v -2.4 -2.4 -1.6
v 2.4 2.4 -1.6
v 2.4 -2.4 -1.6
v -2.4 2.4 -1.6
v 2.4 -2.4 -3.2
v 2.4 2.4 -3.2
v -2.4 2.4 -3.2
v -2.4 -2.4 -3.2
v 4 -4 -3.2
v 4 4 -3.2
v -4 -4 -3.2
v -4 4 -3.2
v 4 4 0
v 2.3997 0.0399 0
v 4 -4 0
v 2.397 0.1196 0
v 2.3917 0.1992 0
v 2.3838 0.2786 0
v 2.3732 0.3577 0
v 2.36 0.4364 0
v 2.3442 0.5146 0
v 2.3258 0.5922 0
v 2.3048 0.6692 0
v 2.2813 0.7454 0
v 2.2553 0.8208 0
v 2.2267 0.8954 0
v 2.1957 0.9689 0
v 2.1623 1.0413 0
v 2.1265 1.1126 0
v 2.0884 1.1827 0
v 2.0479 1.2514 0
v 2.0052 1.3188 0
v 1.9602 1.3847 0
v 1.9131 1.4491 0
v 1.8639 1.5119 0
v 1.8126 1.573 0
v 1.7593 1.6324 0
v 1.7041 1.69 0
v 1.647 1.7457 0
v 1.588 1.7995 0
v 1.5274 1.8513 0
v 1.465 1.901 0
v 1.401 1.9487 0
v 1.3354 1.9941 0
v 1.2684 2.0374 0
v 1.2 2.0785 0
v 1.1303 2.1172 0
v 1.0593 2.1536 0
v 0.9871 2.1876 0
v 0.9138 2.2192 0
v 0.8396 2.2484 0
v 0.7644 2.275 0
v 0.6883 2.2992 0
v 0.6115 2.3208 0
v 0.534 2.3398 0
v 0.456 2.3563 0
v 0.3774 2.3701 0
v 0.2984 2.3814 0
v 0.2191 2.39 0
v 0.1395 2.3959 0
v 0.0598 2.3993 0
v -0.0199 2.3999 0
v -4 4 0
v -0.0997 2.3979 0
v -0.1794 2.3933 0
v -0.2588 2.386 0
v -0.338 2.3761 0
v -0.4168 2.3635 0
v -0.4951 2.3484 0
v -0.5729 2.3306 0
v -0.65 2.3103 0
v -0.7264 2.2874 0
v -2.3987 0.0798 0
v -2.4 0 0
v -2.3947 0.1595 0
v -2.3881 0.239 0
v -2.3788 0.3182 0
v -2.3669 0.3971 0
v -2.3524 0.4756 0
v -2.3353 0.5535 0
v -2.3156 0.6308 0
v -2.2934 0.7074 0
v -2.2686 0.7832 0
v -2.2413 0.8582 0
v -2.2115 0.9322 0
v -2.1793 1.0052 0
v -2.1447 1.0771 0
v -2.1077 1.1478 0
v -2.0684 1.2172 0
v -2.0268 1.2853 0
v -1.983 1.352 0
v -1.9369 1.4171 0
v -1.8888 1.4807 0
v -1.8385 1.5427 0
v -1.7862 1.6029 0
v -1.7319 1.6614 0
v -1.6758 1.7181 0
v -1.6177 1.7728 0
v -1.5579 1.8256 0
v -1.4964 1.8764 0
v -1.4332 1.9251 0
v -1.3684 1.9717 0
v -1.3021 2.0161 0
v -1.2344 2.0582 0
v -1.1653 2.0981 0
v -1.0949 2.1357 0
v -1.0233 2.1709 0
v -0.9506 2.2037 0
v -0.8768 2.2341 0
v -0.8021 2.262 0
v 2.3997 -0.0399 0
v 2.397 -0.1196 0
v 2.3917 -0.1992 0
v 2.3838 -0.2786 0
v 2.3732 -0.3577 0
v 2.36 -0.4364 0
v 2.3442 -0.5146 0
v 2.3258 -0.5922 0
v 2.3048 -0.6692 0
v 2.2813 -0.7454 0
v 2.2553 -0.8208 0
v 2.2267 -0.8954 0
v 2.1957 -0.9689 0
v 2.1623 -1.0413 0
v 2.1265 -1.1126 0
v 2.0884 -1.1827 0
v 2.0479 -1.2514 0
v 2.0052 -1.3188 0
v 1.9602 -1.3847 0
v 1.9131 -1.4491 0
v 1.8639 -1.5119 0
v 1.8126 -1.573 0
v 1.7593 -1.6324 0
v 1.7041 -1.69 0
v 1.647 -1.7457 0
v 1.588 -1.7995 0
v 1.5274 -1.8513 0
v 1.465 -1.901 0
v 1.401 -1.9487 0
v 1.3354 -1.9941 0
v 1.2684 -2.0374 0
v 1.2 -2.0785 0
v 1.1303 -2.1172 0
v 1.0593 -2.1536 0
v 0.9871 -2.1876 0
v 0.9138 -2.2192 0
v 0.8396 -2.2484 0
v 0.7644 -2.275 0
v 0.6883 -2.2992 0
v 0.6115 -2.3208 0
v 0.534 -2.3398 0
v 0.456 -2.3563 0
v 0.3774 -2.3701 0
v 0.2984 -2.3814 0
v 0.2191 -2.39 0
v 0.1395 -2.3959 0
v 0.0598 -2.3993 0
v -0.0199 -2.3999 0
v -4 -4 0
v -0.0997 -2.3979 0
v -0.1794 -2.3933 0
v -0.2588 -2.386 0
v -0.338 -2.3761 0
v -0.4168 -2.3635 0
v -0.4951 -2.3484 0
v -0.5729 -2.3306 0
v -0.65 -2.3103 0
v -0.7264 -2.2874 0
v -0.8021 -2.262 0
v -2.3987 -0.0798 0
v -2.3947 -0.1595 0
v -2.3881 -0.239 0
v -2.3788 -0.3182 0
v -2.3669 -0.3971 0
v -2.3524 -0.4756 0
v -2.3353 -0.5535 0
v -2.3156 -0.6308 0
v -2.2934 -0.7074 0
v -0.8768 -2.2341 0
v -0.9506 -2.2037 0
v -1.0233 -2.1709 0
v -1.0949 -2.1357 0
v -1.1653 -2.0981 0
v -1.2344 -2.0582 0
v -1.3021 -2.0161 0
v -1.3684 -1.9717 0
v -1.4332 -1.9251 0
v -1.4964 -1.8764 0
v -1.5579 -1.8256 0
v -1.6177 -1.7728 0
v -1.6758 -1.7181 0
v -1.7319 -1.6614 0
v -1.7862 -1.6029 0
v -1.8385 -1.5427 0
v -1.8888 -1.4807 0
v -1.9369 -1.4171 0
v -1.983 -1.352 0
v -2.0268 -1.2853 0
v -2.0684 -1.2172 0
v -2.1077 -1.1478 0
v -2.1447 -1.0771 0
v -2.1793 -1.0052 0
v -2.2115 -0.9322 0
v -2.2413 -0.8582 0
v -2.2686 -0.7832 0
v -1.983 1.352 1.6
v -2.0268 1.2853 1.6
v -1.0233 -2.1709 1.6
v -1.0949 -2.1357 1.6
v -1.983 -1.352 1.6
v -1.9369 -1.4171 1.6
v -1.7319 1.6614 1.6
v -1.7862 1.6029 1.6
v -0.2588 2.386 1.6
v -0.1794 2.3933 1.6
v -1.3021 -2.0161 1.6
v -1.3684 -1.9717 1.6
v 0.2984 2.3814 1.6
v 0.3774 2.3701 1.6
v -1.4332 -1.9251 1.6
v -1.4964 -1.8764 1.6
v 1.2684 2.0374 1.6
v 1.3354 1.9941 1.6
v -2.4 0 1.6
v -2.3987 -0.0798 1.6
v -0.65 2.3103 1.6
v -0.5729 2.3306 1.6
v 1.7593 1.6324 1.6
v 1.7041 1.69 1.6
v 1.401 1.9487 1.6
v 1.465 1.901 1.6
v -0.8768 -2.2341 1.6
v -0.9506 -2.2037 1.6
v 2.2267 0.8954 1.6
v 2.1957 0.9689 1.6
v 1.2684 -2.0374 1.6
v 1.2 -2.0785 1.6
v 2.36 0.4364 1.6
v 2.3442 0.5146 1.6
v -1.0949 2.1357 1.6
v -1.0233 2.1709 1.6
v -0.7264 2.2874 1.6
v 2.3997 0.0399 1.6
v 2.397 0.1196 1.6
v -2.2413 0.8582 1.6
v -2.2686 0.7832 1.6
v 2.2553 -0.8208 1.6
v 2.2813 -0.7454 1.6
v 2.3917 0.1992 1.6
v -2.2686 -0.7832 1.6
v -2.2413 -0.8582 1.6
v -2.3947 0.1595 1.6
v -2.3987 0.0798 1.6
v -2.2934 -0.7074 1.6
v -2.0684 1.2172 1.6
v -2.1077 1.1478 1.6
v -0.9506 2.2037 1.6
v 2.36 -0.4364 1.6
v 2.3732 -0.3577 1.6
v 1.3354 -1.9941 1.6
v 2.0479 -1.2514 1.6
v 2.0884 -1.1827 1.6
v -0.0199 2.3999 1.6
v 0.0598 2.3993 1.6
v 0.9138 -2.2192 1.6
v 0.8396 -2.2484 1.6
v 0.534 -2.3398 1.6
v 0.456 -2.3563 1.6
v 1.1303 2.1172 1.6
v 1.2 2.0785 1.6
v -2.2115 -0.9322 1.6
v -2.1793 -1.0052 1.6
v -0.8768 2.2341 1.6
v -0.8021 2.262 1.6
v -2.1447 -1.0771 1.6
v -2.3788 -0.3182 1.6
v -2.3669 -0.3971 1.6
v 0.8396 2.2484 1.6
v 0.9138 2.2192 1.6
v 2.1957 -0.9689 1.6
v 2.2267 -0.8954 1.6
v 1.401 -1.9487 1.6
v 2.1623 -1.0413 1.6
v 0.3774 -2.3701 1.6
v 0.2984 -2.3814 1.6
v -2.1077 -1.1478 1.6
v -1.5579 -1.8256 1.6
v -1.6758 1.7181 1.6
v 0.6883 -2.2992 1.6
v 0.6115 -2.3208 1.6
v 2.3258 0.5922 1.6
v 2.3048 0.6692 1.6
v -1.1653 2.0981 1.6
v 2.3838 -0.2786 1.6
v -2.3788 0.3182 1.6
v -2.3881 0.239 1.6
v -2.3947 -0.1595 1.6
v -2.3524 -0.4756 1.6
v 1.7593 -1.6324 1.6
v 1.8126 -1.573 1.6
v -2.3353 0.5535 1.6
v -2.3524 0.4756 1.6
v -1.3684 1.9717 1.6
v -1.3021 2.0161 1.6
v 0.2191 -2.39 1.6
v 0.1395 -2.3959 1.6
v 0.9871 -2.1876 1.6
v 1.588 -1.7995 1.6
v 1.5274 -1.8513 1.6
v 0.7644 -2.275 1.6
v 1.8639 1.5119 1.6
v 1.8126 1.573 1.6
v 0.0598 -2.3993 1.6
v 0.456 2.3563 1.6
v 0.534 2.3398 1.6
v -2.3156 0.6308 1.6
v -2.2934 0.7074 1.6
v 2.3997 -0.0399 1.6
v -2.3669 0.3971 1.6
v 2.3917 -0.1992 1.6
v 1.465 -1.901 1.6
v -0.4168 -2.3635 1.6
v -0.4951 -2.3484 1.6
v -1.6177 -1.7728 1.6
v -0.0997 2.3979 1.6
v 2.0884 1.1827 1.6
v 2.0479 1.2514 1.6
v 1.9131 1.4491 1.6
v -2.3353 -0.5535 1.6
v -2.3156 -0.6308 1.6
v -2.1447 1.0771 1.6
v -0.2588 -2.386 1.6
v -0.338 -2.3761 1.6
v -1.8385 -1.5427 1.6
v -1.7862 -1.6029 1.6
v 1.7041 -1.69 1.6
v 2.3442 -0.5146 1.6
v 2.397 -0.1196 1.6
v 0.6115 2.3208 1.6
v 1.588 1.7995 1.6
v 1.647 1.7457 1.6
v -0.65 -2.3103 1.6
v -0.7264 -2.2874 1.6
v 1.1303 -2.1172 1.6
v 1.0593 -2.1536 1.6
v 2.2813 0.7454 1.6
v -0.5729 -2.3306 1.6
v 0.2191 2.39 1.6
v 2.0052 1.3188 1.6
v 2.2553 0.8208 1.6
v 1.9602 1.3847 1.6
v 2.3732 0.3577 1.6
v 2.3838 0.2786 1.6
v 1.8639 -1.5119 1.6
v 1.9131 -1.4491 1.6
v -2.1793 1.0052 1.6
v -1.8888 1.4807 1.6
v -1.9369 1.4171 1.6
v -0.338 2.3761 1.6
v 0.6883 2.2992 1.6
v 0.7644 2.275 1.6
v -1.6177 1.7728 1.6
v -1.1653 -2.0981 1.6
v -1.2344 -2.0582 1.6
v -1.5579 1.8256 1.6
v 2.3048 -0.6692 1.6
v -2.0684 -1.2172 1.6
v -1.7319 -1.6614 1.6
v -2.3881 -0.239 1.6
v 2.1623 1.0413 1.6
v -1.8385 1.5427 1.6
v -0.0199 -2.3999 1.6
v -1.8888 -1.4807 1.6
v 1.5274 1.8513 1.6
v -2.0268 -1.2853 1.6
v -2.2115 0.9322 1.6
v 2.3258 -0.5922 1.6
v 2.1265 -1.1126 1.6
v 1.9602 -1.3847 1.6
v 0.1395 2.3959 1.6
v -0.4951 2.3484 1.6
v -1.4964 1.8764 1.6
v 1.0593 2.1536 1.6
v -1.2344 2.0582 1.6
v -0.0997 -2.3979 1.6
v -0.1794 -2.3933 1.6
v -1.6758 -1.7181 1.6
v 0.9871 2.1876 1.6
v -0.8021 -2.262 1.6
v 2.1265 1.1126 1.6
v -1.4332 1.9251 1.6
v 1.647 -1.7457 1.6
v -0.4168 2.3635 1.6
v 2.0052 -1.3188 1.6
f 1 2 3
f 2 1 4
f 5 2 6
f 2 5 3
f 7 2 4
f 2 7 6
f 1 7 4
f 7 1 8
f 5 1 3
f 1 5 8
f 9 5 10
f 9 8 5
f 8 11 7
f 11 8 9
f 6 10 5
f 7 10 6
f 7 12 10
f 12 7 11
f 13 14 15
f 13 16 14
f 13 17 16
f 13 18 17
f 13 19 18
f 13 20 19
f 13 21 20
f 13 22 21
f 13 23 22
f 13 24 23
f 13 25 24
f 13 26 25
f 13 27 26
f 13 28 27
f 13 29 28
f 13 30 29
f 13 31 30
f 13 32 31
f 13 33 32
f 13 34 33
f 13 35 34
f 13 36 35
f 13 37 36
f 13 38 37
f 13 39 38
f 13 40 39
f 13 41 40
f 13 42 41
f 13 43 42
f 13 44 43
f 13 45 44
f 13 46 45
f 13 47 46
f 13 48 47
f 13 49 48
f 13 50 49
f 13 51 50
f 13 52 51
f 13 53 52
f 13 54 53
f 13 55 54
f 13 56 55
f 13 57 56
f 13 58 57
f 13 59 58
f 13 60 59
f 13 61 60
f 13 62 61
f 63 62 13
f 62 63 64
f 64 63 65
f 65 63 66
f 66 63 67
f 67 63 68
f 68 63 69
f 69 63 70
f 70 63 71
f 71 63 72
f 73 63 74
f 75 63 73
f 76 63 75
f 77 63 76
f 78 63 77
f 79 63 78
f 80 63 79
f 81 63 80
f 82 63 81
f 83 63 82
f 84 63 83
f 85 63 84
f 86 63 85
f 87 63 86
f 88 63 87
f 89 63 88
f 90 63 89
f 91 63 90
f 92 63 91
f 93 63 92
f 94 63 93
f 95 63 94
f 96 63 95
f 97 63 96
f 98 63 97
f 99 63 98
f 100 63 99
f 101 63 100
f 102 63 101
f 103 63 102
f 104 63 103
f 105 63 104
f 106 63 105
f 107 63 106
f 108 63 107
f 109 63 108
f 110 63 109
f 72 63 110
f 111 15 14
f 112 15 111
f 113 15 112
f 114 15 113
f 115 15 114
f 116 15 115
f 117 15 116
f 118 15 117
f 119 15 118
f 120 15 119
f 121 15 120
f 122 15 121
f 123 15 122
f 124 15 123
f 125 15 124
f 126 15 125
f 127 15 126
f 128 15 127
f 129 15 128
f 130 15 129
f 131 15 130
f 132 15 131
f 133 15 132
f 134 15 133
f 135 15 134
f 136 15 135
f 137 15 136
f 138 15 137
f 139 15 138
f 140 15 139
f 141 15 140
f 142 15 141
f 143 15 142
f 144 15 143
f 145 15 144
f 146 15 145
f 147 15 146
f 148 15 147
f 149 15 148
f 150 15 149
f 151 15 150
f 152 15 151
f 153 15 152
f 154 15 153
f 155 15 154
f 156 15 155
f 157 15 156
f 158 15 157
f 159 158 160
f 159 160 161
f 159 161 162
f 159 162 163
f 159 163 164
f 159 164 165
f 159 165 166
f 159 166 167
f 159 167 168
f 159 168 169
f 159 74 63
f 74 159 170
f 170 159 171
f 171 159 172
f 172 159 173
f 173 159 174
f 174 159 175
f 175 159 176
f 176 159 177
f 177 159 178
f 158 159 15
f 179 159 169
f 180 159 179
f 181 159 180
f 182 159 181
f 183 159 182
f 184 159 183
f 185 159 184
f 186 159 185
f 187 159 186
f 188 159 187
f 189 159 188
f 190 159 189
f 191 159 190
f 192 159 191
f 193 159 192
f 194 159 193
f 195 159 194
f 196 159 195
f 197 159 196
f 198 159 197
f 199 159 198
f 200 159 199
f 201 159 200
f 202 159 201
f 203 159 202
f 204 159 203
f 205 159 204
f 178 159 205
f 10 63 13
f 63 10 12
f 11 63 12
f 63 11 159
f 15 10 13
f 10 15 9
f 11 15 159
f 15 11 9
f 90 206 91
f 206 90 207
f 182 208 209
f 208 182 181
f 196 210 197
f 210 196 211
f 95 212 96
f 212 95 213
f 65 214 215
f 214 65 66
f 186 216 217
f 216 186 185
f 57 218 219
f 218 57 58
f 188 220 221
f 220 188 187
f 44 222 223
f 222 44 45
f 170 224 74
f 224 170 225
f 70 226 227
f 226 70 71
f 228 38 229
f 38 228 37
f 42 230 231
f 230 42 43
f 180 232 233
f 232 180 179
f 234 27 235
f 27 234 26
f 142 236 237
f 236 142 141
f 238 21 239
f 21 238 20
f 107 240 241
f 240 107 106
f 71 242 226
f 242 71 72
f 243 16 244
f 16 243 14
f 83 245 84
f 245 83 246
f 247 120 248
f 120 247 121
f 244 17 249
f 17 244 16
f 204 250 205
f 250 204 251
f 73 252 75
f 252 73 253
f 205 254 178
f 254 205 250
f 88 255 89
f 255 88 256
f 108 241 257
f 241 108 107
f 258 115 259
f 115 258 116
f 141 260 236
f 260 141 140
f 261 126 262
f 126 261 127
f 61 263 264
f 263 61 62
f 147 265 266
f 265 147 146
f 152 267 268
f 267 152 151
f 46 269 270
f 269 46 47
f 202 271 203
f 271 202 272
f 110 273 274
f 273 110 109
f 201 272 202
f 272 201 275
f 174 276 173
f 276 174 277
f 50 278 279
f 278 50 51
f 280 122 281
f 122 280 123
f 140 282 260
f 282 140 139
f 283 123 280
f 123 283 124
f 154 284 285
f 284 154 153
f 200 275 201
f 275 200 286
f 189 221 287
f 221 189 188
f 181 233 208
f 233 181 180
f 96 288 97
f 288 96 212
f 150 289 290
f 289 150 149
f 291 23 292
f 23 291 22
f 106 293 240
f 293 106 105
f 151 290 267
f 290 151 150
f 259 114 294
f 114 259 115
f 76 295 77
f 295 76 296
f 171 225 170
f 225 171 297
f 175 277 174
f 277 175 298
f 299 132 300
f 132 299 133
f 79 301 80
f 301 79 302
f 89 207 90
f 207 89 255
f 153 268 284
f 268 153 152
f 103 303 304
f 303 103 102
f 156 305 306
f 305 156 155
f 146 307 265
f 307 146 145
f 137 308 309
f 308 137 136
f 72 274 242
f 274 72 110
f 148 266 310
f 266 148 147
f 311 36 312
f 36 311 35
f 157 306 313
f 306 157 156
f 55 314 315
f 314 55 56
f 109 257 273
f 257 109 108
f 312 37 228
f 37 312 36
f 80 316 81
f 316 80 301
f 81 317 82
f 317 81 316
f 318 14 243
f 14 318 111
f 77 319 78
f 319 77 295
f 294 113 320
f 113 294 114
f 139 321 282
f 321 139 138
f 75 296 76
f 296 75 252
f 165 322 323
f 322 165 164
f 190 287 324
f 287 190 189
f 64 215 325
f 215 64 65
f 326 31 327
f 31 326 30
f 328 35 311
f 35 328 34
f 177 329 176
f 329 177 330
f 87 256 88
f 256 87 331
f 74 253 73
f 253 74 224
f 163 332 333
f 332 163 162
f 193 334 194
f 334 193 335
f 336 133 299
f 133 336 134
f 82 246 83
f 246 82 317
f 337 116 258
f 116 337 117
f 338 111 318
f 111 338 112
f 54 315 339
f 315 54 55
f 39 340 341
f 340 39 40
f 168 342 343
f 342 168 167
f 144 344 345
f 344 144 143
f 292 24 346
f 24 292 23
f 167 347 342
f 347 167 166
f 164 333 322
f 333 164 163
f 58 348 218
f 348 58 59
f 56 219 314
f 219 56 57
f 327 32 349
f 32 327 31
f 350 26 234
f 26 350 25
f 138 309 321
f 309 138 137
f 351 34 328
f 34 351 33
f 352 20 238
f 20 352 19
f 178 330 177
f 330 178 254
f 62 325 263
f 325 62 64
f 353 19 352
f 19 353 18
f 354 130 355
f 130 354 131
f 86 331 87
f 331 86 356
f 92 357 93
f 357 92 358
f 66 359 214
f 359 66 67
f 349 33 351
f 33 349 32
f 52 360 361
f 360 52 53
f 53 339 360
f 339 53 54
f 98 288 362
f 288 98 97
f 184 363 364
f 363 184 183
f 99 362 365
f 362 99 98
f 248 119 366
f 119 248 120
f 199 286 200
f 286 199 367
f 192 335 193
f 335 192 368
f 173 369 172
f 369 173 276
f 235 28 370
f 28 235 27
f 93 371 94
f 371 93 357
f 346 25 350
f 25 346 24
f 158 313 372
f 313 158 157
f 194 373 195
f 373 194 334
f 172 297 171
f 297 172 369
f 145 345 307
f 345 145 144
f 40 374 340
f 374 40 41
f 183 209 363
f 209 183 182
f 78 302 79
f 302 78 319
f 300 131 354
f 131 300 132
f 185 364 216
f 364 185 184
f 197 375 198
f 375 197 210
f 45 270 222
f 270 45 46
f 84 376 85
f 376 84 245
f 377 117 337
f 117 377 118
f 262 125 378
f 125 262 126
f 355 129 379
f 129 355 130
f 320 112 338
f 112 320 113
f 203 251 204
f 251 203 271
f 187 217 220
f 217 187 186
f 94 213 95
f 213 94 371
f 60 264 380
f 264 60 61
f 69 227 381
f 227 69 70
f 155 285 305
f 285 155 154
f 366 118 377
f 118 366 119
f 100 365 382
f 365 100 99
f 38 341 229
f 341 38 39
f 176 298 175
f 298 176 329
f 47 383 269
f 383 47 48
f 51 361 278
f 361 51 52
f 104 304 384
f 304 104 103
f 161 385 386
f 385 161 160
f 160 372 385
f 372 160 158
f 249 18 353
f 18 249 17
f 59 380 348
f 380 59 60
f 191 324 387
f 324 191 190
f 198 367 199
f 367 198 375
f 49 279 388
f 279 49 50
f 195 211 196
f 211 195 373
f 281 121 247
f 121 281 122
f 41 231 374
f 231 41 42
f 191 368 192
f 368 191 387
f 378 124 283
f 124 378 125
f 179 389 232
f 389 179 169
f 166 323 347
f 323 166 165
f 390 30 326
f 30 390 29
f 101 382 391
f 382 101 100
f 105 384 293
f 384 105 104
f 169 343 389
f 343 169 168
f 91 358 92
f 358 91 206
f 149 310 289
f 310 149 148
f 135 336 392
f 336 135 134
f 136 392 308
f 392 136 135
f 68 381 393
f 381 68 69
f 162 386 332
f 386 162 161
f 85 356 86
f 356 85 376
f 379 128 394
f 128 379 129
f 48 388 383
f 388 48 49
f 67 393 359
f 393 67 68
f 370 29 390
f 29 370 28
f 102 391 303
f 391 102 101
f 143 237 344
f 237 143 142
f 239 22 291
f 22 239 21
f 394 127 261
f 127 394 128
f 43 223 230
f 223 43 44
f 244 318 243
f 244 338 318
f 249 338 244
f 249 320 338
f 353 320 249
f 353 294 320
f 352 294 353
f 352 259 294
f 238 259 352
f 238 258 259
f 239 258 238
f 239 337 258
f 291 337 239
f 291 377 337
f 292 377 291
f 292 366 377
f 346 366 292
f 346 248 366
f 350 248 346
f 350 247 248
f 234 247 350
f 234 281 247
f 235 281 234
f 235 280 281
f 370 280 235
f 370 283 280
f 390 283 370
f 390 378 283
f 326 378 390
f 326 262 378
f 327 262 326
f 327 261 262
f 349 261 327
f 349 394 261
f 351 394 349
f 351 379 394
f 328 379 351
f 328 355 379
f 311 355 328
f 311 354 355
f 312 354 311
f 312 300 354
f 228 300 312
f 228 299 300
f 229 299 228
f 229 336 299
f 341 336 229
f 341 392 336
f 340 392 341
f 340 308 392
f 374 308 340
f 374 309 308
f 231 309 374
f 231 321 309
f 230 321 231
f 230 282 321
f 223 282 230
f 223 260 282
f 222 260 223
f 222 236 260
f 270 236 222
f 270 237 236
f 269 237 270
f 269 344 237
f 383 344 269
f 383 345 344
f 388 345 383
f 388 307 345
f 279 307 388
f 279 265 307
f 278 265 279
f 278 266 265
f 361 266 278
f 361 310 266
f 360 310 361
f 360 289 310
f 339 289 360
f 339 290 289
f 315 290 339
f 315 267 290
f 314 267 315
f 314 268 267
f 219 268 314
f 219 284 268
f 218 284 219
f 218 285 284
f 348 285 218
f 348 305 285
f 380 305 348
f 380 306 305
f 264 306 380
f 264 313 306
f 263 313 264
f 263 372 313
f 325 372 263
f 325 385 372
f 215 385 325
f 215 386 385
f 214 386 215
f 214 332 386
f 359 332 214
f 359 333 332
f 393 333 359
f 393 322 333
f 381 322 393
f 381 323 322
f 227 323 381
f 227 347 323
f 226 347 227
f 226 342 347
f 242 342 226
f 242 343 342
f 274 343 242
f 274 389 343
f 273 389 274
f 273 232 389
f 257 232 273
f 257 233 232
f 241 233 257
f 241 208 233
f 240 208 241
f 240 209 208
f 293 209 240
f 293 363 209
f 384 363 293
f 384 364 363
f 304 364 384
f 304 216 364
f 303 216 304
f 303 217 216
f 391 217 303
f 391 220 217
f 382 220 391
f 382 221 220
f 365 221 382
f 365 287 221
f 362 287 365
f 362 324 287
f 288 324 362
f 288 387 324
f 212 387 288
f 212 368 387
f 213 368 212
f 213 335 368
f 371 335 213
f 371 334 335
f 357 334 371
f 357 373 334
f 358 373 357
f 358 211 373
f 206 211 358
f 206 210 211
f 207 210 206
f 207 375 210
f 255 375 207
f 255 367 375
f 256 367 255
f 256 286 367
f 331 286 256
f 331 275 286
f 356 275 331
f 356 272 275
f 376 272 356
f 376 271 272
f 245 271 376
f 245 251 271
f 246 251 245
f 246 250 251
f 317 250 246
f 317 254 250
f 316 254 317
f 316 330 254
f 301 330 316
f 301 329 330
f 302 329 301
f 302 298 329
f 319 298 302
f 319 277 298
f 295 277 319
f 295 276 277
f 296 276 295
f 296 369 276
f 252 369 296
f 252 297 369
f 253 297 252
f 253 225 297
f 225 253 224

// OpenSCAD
// file: ../p/stud3.scad
use <../lib.scad>
use <4-4cyli.scad>
use <4-4disc.scad>
use <4-4edge.scad>
$fa=1; $fs=0.2;
function ldraw_lib__stud3(realsolid=false) = realsolid ? 
    [openscad(translate([0,0,-eps()], o=cylinder(4+eps(), r=4)),2)] : [
// 0 Stud Tube Solid
// 0 Name: stud3.dat
// 0 Author: James Jessiman
// 0 !LDRAW_ORG Primitive UPDATE 2012-01
// 0 !LICENSE Licensed under CC BY 2.0 and CC BY 4.0 : see CAreadme.txt
// 
// 0 BFC CERTIFY CCW
  [0,"BFC","CERTIFY"],
  [0,"BFC","CCW"],
// 
// 0 !HISTORY 2002-04-04 [sbliss] Modified for BFC compliance
// 0 !HISTORY 2002-04-25 [PTadmin] Official Update 2002-02
// 0 !HISTORY 2007-06-24 [PTadmin] Header formatted for Contributor Agreement
// 0 !HISTORY 2008-07-01 [PTadmin] Official Update 2008-01
// 0 !HISTORY 2012-02-16 [Philo] Changed to CCW
// 0 !HISTORY 2012-03-30 [PTadmin] Official Update 2012-01
// 
// 
// 1 16 0 -4 0 4 0 0 0 1 0 0 0 4 4-4edge.dat
  [1,16,0,-4,0,4,0,0,0,1,0,0,0,4, ldraw_lib__4_4edge(realsolid)],
// 1 16 0 0 0 4 0 0 0 1 0 0 0 4 4-4edge.dat
  [1,16,0,0,0,4,0,0,0,1,0,0,0,4, ldraw_lib__4_4edge(realsolid)],
// 1 16 0 -4 0 4 0 0 0 1 0 0 0 4 4-4disc.dat
  [1,16,0,-4,0,4,0,0,0,1,0,0,0,4, ldraw_lib__4_4disc(realsolid)],
// 1 16 0 -4 0 4 0 0 0 4 0 0 0 4 4-4cyli.dat
  [1,16,0,-4,0,4,0,0,0,4,0,0,0,4, ldraw_lib__4_4cyli(realsolid)],
];
module ldraw_lib__stud3(step=0, col=false, unit=2/5, alt=false, line=0.2, solid=!$preview)
    makepoly(ldraw_lib__stud3(solid), step=step, col=col, unit=unit, alt=alt, line=line, solid=solid);
ldraw_lib__stud3(line=0.2);
// file: ../p/4-4edge.scad
use <../lib.scad>
$fa=1; $fs=0.2;
function ldraw_lib__4_4edge(realsolid=false) = [
// 0 Circle 1.0
// 0 Name: 4-4edge.dat
// 0 Author: James Jessiman
// 0 !LDRAW_ORG Primitive UPDATE 2017-01
// 0 !LICENSE Licensed under CC BY 2.0 and CC BY 4.0 : see CAreadme.txt
// 
// 0 BFC CERTIFY CCW
  [0,"BFC","CERTIFY"],
  [0,"BFC","CCW"],
// 
// 0 !HISTORY 1998-12-15 [PTadmin] Official Update 1998-10
// 0 !HISTORY 2005-12-28 [PTadmin] Official Update 2005-01
// 0 !HISTORY 2007-06-24 [PTadmin] Header formatted for Contributor Agreement
// 0 !HISTORY 2008-07-01 [PTadmin] Official Update 2008-01
// 0 !HISTORY 2017-01-15 [Steffen] BFCed
// 0 !HISTORY 2017-12-30 [PTadmin] Official Update 2017-01
// 
// 
// 2 24 1 0 0 0.9239 0 0.3827
  [2,24,1,0,0,0.9239,0,0.3827],
// 2 24 0.9239 0 0.3827 0.7071 0 0.7071
  [2,24,0.9239,0,0.3827,0.7071,0,0.7071],
// 2 24 0.7071 0 0.7071 0.3827 0 0.9239
  [2,24,0.7071,0,0.7071,0.3827,0,0.9239],
// 2 24 0.3827 0 0.9239 0 0 1
  [2,24,0.3827,0,0.9239,0,0,1],
// 2 24 0 0 1 -0.3827 0 0.9239
  [2,24,0,0,1,-0.3827,0,0.9239],
// 2 24 -0.3827 0 0.9239 -0.7071 0 0.7071
  [2,24,-0.3827,0,0.9239,-0.7071,0,0.7071],
// 2 24 -0.7071 0 0.7071 -0.9239 0 0.3827
  [2,24,-0.7071,0,0.7071,-0.9239,0,0.3827],
// 2 24 -0.9239 0 0.3827 -1 0 -0
  [2,24,-0.9239,0,0.3827,-1,0,-0],
// 2 24 -1 0 -0 -0.9239 0 -0.3827
  [2,24,-1,0,-0,-0.9239,0,-0.3827],
// 2 24 -0.9239 0 -0.3827 -0.7071 0 -0.7071
  [2,24,-0.9239,0,-0.3827,-0.7071,0,-0.7071],
// 2 24 -0.7071 0 -0.7071 -0.3827 0 -0.9239
  [2,24,-0.7071,0,-0.7071,-0.3827,0,-0.9239],
// 2 24 -0.3827 0 -0.9239 0 0 -1
  [2,24,-0.3827,0,-0.9239,0,0,-1],
// 2 24 0 0 -1 0.3827 0 -0.9239
  [2,24,0,0,-1,0.3827,0,-0.9239],
// 2 24 0.3827 0 -0.9239 0.7071 0 -0.7071
  [2,24,0.3827,0,-0.9239,0.7071,0,-0.7071],
// 2 24 0.7071 0 -0.7071 0.9239 0 -0.3827
  [2,24,0.7071,0,-0.7071,0.9239,0,-0.3827],
// 2 24 0.9239 0 -0.3827 1 0 0
  [2,24,0.9239,0,-0.3827,1,0,0],
];
module ldraw_lib__4_4edge(step=0, col=false, unit=2/5, alt=false, line=0.2, solid=!$preview)
    makepoly(ldraw_lib__4_4edge(solid), step=step, col=col, unit=unit, alt=alt, line=line, solid=solid);
ldraw_lib__4_4edge(line=0.2);
// file: ../p/4-4disc.scad
use <../lib.scad>
$fa=1; $fs=0.2;
function ldraw_lib__4_4disc(realsolid=false) = [
// 0 Disc 1.0
// 0 Name: 4-4disc.dat
// 0 Author: James Jessiman
// 0 !LDRAW_ORG Primitive UPDATE 2002-02
// 0 !LICENSE Licensed under CC BY 2.0 and CC BY 4.0 : see CAreadme.txt
// 
// 0 BFC CERTIFY CCW
  [0,"BFC","CERTIFY"],
  [0,"BFC","CCW"],
// 
// 0 !HISTORY 1998-12-15 [PTadmin] Official Update 1998-10
// 0 !HISTORY 2002-03-23 [sbliss] Added BFC statement
// 0 !HISTORY 2002-04-25 [PTadmin] Official Update 2002-02
// 0 !HISTORY 2007-06-24 [PTadmin] Header formatted for Contributor Agreement
// 0 !HISTORY 2008-07-01 [PTadmin] Official Update 2008-01
// 
// 
// 3 16 0 0 0 1 0 0 0.9239 0 0.3827
  [3,16,0,0,0,1,0,0,0.9239,0,0.3827],
// 3 16 0 0 0 0.9239 0 0.3827 0.7071 0 0.7071
  [3,16,0,0,0,0.9239,0,0.3827,0.7071,0,0.7071],
// 3 16 0 0 0 0.7071 0 0.7071 0.3827 0 0.9239
  [3,16,0,0,0,0.7071,0,0.7071,0.3827,0,0.9239],
// 3 16 0 0 0 0.3827 0 0.9239 0 0 1
  [3,16,0,0,0,0.3827,0,0.9239,0,0,1],
// 3 16 0 0 0 0 0 1 -0.3827 0 0.9239
  [3,16,0,0,0,0,0,1,-0.3827,0,0.9239],
// 3 16 0 0 0 -0.3827 0 0.9239 -0.7071 0 0.7071
  [3,16,0,0,0,-0.3827,0,0.9239,-0.7071,0,0.7071],
// 3 16 0 0 0 -0.7071 0 0.7071 -0.9239 0 0.3827
  [3,16,0,0,0,-0.7071,0,0.7071,-0.9239,0,0.3827],
// 3 16 0 0 0 -0.9239 0 0.3827 -1 0 -0
  [3,16,0,0,0,-0.9239,0,0.3827,-1,0,-0],
// 3 16 0 0 0 -1 0 -0 -0.9239 0 -0.3827
  [3,16,0,0,0,-1,0,-0,-0.9239,0,-0.3827],
// 3 16 0 0 0 -0.9239 0 -0.3827 -0.7071 0 -0.7071
  [3,16,0,0,0,-0.9239,0,-0.3827,-0.7071,0,-0.7071],
// 3 16 0 0 0 -0.7071 0 -0.7071 -0.3827 0 -0.9239
  [3,16,0,0,0,-0.7071,0,-0.7071,-0.3827,0,-0.9239],
// 3 16 0 0 0 -0.3827 0 -0.9239 0 0 -1
  [3,16,0,0,0,-0.3827,0,-0.9239,0,0,-1],
// 3 16 0 0 0 0 0 -1 0.3827 0 -0.9239
  [3,16,0,0,0,0,0,-1,0.3827,0,-0.9239],
// 3 16 0 0 0 0.3827 0 -0.9239 0.7071 0 -0.7071
  [3,16,0,0,0,0.3827,0,-0.9239,0.7071,0,-0.7071],
// 3 16 0 0 0 0.7071 0 -0.7071 0.9239 0 -0.3827
  [3,16,0,0,0,0.7071,0,-0.7071,0.9239,0,-0.3827],
// 3 16 0 0 0 0.9239 0 -0.3827 1 0 0
  [3,16,0,0,0,0.9239,0,-0.3827,1,0,0],
// 0
];
module ldraw_lib__4_4disc(step=0, col=false, unit=2/5, alt=false, line=0.2, solid=!$preview)
    makepoly(ldraw_lib__4_4disc(solid), step=step, col=col, unit=unit, alt=alt, line=line, solid=solid);
ldraw_lib__4_4disc(line=0.2);
// file: ../p/4-4cyli.scad
use <../lib.scad>
$fa=1; $fs=0.2;
function ldraw_lib__4_4cyli(realsolid=false) = [
// 0 Cylinder 1.0
// 0 Name: 4-4cyli.dat
// 0 Author: James Jessiman
// 0 !LDRAW_ORG Primitive UPDATE 2005-01
// 0 !LICENSE Licensed under CC BY 2.0 and CC BY 4.0 : see CAreadme.txt
// 
// 0 BFC CERTIFY CCW
  [0,"BFC","CERTIFY"],
  [0,"BFC","CCW"],
// 
// 0 !HISTORY 1998-12-15 [PTadmin] Official Update 1998-10
// 0 !HISTORY 2002-03-23 [sbliss] Added BFC statement; merged headers from files in distributions LDraw 0.27 and Complete.
// 0 !HISTORY 2002-04-25 [PTadmin] Official Update 2002-02
// 0 !HISTORY 2004-12-14 [guyvivan] BFC CCW
// 0 !HISTORY 2005-12-28 [PTadmin] Official Update 2005-01
// 0 !HISTORY 2007-06-24 [PTadmin] Header formatted for Contributor Agreement
// 0 !HISTORY 2008-07-01 [PTadmin] Official Update 2008-01
// 
// 
// 4 16 1 1 0 0.9239 1 0.3827 0.9239 0 0.3827 1 0 0
  [4,16,1,1,0,0.9239,1,0.3827,0.9239,0,0.3827,1,0,0],
// 5 24 1 0 0 1 1 0 0.9239 0 0.3827 0.9239 0 -0.3827
  [5,24,1,0,0,1,1,0,0.9239,0,0.3827,0.9239,0,-0.3827],
// 4 16 0.9239 1 0.3827 0.7071 1 0.7071 0.7071 0 0.7071 0.9239 0 0.3827
  [4,16,0.9239,1,0.3827,0.7071,1,0.7071,0.7071,0,0.7071,0.9239,0,0.3827],
// 5 24 0.9239 0 0.3827 0.9239 1 0.3827 0.7071 0 0.7071 1 0 0
  [5,24,0.9239,0,0.3827,0.9239,1,0.3827,0.7071,0,0.7071,1,0,0],
// 4 16 0.7071 1 0.7071 0.3827 1 0.9239 0.3827 0 0.9239 0.7071 0 0.7071
  [4,16,0.7071,1,0.7071,0.3827,1,0.9239,0.3827,0,0.9239,0.7071,0,0.7071],
// 5 24 0.7071 0 0.7071 0.7071 1 0.7071 0.3827 0 0.9239 0.9239 0 0.3827
  [5,24,0.7071,0,0.7071,0.7071,1,0.7071,0.3827,0,0.9239,0.9239,0,0.3827],
// 4 16 0.3827 1 0.9239 0 1 1 0 0 1 0.3827 0 0.9239
  [4,16,0.3827,1,0.9239,0,1,1,0,0,1,0.3827,0,0.9239],
// 5 24 0.3827 0 0.9239 0.3827 1 0.9239 0 0 1 0.7071 0 0.7071
  [5,24,0.3827,0,0.9239,0.3827,1,0.9239,0,0,1,0.7071,0,0.7071],
// 4 16 0 1 1 -0.3827 1 0.9239 -0.3827 0 0.9239 0 0 1
  [4,16,0,1,1,-0.3827,1,0.9239,-0.3827,0,0.9239,0,0,1],
// 5 24 0 0 1 0 1 1 -0.3827 0 0.9239 0.3827 0 0.9239
  [5,24,0,0,1,0,1,1,-0.3827,0,0.9239,0.3827,0,0.9239],
// 4 16 -0.3827 1 0.9239 -0.7071 1 0.7071 -0.7071 0 0.7071 -0.3827 0 0.9239
  [4,16,-0.3827,1,0.9239,-0.7071,1,0.7071,-0.7071,0,0.7071,-0.3827,0,0.9239],
// 5 24 -0.3827 0 0.9239 -0.3827 1 0.9239 -0.7071 0 0.7071 0 0 1
  [5,24,-0.3827,0,0.9239,-0.3827,1,0.9239,-0.7071,0,0.7071,0,0,1],
// 4 16 -0.7071 1 0.7071 -0.9239 1 0.3827 -0.9239 0 0.3827 -0.7071 0 0.7071
  [4,16,-0.7071,1,0.7071,-0.9239,1,0.3827,-0.9239,0,0.3827,-0.7071,0,0.7071],
// 5 24 -0.7071 0 0.7071 -0.7071 1 0.7071 -0.9239 0 0.3827 -0.3827 0 0.9239
  [5,24,-0.7071,0,0.7071,-0.7071,1,0.7071,-0.9239,0,0.3827,-0.3827,0,0.9239],
// 4 16 -0.9239 1 0.3827 -1 1 0 -1 0 0 -0.9239 0 0.3827
  [4,16,-0.9239,1,0.3827,-1,1,0,-1,0,0,-0.9239,0,0.3827],
// 5 24 -0.9239 0 0.3827 -0.9239 1 0.3827 -1 0 0 -0.7071 0 0.7071
  [5,24,-0.9239,0,0.3827,-0.9239,1,0.3827,-1,0,0,-0.7071,0,0.7071],
// 4 16 -1 1 0 -0.9239 1 -0.3827 -0.9239 0 -0.3827 -1 0 0
  [4,16,-1,1,0,-0.9239,1,-0.3827,-0.9239,0,-0.3827,-1,0,0],
// 5 24 -1 0 0 -1 1 0 -0.9239 0 -0.3827 -0.9239 0 0.3827
  [5,24,-1,0,0,-1,1,0,-0.9239,0,-0.3827,-0.9239,0,0.3827],
// 4 16 -0.9239 1 -0.3827 -0.7071 1 -0.7071 -0.7071 0 -0.7071 -0.9239 0 -0.3827
  [4,16,-0.9239,1,-0.3827,-0.7071,1,-0.7071,-0.7071,0,-0.7071,-0.9239,0,-0.3827],
// 5 24 -0.9239 0 -0.3827 -0.9239 1 -0.3827 -0.7071 0 -0.7071 -1 0 0
  [5,24,-0.9239,0,-0.3827,-0.9239,1,-0.3827,-0.7071,0,-0.7071,-1,0,0],
// 4 16 -0.7071 1 -0.7071 -0.3827 1 -0.9239 -0.3827 0 -0.9239 -0.7071 0 -0.7071
  [4,16,-0.7071,1,-0.7071,-0.3827,1,-0.9239,-0.3827,0,-0.9239,-0.7071,0,-0.7071],
// 5 24 -0.7071 0 -0.7071 -0.7071 1 -0.7071 -0.3827 0 -0.9239 -0.9239 0 -0.3827
  [5,24,-0.7071,0,-0.7071,-0.7071,1,-0.7071,-0.3827,0,-0.9239,-0.9239,0,-0.3827],
// 4 16 -0.3827 1 -0.9239 0 1 -1 0 0 -1 -0.3827 0 -0.9239
  [4,16,-0.3827,1,-0.9239,0,1,-1,0,0,-1,-0.3827,0,-0.9239],
// 5 24 -0.3827 0 -0.9239 -0.3827 1 -0.9239 0 0 -1 -0.7071 0 -0.7071
  [5,24,-0.3827,0,-0.9239,-0.3827,1,-0.9239,0,0,-1,-0.7071,0,-0.7071],
// 4 16 0 1 -1 0.3827 1 -0.9239 0.3827 0 -0.9239 0 0 -1
  [4,16,0,1,-1,0.3827,1,-0.9239,0.3827,0,-0.9239,0,0,-1],
// 5 24 0 0 -1 0 1 -1 0.3827 0 -0.9239 -0.3827 0 -0.9239
  [5,24,0,0,-1,0,1,-1,0.3827,0,-0.9239,-0.3827,0,-0.9239],
// 4 16 0.3827 1 -0.9239 0.7071 1 -0.7071 0.7071 0 -0.7071 0.3827 0 -0.9239
  [4,16,0.3827,1,-0.9239,0.7071,1,-0.7071,0.7071,0,-0.7071,0.3827,0,-0.9239],
// 5 24 0.3827 0 -0.9239 0.3827 1 -0.9239 0.7071 0 -0.7071 0 0 -1
  [5,24,0.3827,0,-0.9239,0.3827,1,-0.9239,0.7071,0,-0.7071,0,0,-1],
// 4 16 0.7071 1 -0.7071 0.9239 1 -0.3827 0.9239 0 -0.3827 0.7071 0 -0.7071
  [4,16,0.7071,1,-0.7071,0.9239,1,-0.3827,0.9239,0,-0.3827,0.7071,0,-0.7071],
// 5 24 0.7071 0 -0.7071 0.7071 1 -0.7071 0.9239 0 -0.3827 0.3827 0 -0.9239
  [5,24,0.7071,0,-0.7071,0.7071,1,-0.7071,0.9239,0,-0.3827,0.3827,0,-0.9239],
// 4 16 0.9239 1 -0.3827 1 1 0 1 0 0 0.9239 0 -0.3827
  [4,16,0.9239,1,-0.3827,1,1,0,1,0,0,0.9239,0,-0.3827],
// 5 24 0.9239 0 -0.3827 0.9239 1 -0.3827 1 0 0 0.7071 0 -0.7071
  [5,24,0.9239,0,-0.3827,0.9239,1,-0.3827,1,0,0,0.7071,0,-0.7071],
// 0
];
module ldraw_lib__4_4cyli(step=0, col=false, unit=2/5, alt=false, line=0.2, solid=!$preview)
    makepoly(ldraw_lib__4_4cyli(solid), step=step, col=col, unit=unit, alt=alt, line=line, solid=solid);
ldraw_lib__4_4cyli(line=0.2);
// file: s/3004s01.scad
use <../../lib.scad>
use <../../p/box4t.scad>
use <../../p/box5.scad>
use <../../p/stud.scad>
use <../../p/stud3.scad>
$fa=1; $fs=0.2;
function ldraw_lib__s__3004s01(realsolid=false) = [
// 0 ~Brick  1 x  2 without Front Face
// 0 Name: s\3004s01.dat
// 0 Author: James Jessiman
// 0 !LDRAW_ORG Subpart UPDATE 2003-03
// 0 !LICENSE Licensed under CC BY 2.0 and CC BY 4.0 : see CAreadme.txt
// 
// 0 BFC CERTIFY CCW
  [0,"BFC","CERTIFY"],
  [0,"BFC","CCW"],
// 
// 0 !HISTORY 2003-09-07 [jriley] Subfiling, BFC
// 0 !HISTORY 2003-12-19 [PTadmin] Official Update 2003-03
// 0 !HISTORY 2007-08-29 [PTadmin] Header formatted for Contributor Agreement
// 0 !HISTORY 2008-07-01 [PTadmin] Official Update 2008-01
// 
// 
// 1 16 0 4 0 1 0 0 0 -5 0 0 0 1 stud3.dat
  [1,16,0,4,0,1,0,0,0,-5,0,0,0,1, ldraw_lib__stud3(realsolid)],
// 0 BFC INVERTNEXT
  [0,"BFC","INVERTNEXT"],
// 1 16 0 24 0 16 0 0 0 -20 0 0 0 6 box5.dat
  [1,16,0,24,0,16,0,0,0,-20,0,0,0,6, ldraw_lib__box5(realsolid)],
// 4 16 20 24 10 16 24 6 -16 24 6 -20 24 10
  [4,16,20,24,10,16,24,6,-16,24,6,-20,24,10],
// 4 16 -20 24 10 -16 24 6 -16 24 -6 -20 24 -10
  [4,16,-20,24,10,-16,24,6,-16,24,-6,-20,24,-10],
// 4 16 -20 24 -10 -16 24 -6 16 24 -6 20 24 -10
  [4,16,-20,24,-10,-16,24,-6,16,24,-6,20,24,-10],
// 4 16 20 24 -10 16 24 -6 16 24 6 20 24 10
  [4,16,20,24,-10,16,24,-6,16,24,6,20,24,10],
// 1 16 0 24 0 20 0 0 0 -24 0 0 0 10 box4t.dat
  [1,16,0,24,0,20,0,0,0,-24,0,0,0,10, ldraw_lib__box4t(realsolid)],
// 1 16 10 0 0 1 0 0 0 1 0 0 0 1 stud.dat
  [1,16,10,0,0,1,0,0,0,1,0,0,0,1, ldraw_lib__stud(realsolid)],
// 1 16 -10 0 0 1 0 0 0 1 0 0 0 1 stud.dat
  [1,16,-10,0,0,1,0,0,0,1,0,0,0,1, ldraw_lib__stud(realsolid)],
// 0
];
module ldraw_lib__s__3004s01(step=0, col=false, unit=2/5, alt=false, line=0.2, solid=!$preview)
    makepoly(ldraw_lib__s__3004s01(solid), step=step, col=col, unit=unit, alt=alt, line=line, solid=solid);
ldraw_lib__s__3004s01(line=0.2);
// file: ../p/stud.scad
use <../lib.scad>
use <4-4cyli.scad>
use <4-4disc.scad>
use <4-4edge.scad>
$fa=1; $fs=0.2;
function ldraw_lib__stud(realsolid=false) = realsolid ? 
    [openscad(translate([0,0,-eps()], o=cylinder(4+eps(), r=6)),2)] : [
// 0 Stud
// 0 Name: stud.dat
// 0 Author: James Jessiman
// 0 !LDRAW_ORG Primitive UPDATE 2012-01
// 0 !LICENSE Licensed under CC BY 2.0 and CC BY 4.0 : see CAreadme.txt
// 
// 0 BFC CERTIFY CCW
  [0,"BFC","CERTIFY"],
  [0,"BFC","CCW"],
// 
// 0 !HISTORY 2002-04-04 [sbliss] Modified for BFC compliance
// 0 !HISTORY 2002-04-25 [PTadmin] Official Update 2002-02
// 0 !HISTORY 2007-06-24 [PTadmin] Header formatted for Contributor Agreement
// 0 !HISTORY 2008-07-01 [PTadmin] Official Update 2008-01
// 0 !HISTORY 2012-02-16 [Philo] Changed to CCW
// 0 !HISTORY 2012-03-30 [PTadmin] Official Update 2012-01
// 
// 
// 1 16 0 0 0 6 0 0 0 1 0 0 0 6 4-4edge.dat
  [1,16,0,0,0,6,0,0,0,1,0,0,0,6, ldraw_lib__4_4edge(realsolid)],
// 1 16 0 -4 0 6 0 0 0 1 0 0 0 6 4-4edge.dat
  [1,16,0,-4,0,6,0,0,0,1,0,0,0,6, ldraw_lib__4_4edge(realsolid)],
// 1 16 0 0 0 6 0 0 0 -4 0 0 0 6 4-4cyli.dat
  [1,16,0,0,0,6,0,0,0,-4,0,0,0,6, ldraw_lib__4_4cyli(realsolid)],
// 1 16 0 -4 0 6 0 0 0 1 0 0 0 6 4-4disc.dat
  [1,16,0,-4,0,6,0,0,0,1,0,0,0,6, ldraw_lib__4_4disc(realsolid)],
];
module ldraw_lib__stud(step=0, col=false, unit=2/5, alt=false, line=0.2, solid=!$preview)
    makepoly(ldraw_lib__stud(solid), step=step, col=col, unit=unit, alt=alt, line=line, solid=solid);
ldraw_lib__stud(line=0.2);
// file: ../p/box5.scad
use <../lib.scad>
$fa=1; $fs=0.2;
function ldraw_lib__box5(realsolid=false) = [
// 0 Box with 5 Faces and All Edges
// 0 Name: box5.dat
// 0 Author: James Jessiman
// 0 !LDRAW_ORG Primitive UPDATE 2012-01
// 0 !LICENSE Licensed under CC BY 2.0 and CC BY 4.0 : see CAreadme.txt
// 
// 0 BFC CERTIFY CCW
  [0,"BFC","CERTIFY"],
  [0,"BFC","CCW"],
// 
// 0 !HISTORY 2002-04-03 [sbliss] Modified for BFC compliance
// 0 !HISTORY 2002-04-25 [PTadmin] Official Update 2002-02
// 0 !HISTORY 2007-06-24 [PTadmin] Header formatted for Contributor Agreement
// 0 !HISTORY 2008-07-01 [PTadmin] Official Update 2008-01
// 0 !HISTORY 2012-02-16 [Philo] Changed to CCW
// 0 !HISTORY 2012-03-30 [PTadmin] Official Update 2012-01
// 
// 
// 2 24 1 1 1 -1 1 1
  [2,24,1,1,1,-1,1,1],
// 2 24 -1 1 1 -1 1 -1
  [2,24,-1,1,1,-1,1,-1],
// 2 24 -1 1 -1 1 1 -1
  [2,24,-1,1,-1,1,1,-1],
// 2 24 1 1 -1 1 1 1
  [2,24,1,1,-1,1,1,1],
// 2 24 1 0 1 -1 0 1
  [2,24,1,0,1,-1,0,1],
// 2 24 -1 0 1 -1 0 -1
  [2,24,-1,0,1,-1,0,-1],
// 2 24 -1 0 -1 1 0 -1
  [2,24,-1,0,-1,1,0,-1],
// 2 24 1 0 -1 1 0 1
  [2,24,1,0,-1,1,0,1],
// 2 24 1 0 1 1 1 1
  [2,24,1,0,1,1,1,1],
// 2 24 -1 0 1 -1 1 1
  [2,24,-1,0,1,-1,1,1],
// 2 24 1 0 -1 1 1 -1
  [2,24,1,0,-1,1,1,-1],
// 2 24 -1 0 -1 -1 1 -1
  [2,24,-1,0,-1,-1,1,-1],
// 4 16 -1 1 1 1 1 1 1 1 -1 -1 1 -1
  [4,16,-1,1,1,1,1,1,1,1,-1,-1,1,-1],
// 4 16 -1 1 1 -1 0 1 1 0 1 1 1 1
  [4,16,-1,1,1,-1,0,1,1,0,1,1,1,1],
// 4 16 -1 1 -1 -1 0 -1 -1 0 1 -1 1 1
  [4,16,-1,1,-1,-1,0,-1,-1,0,1,-1,1,1],
// 4 16 1 1 -1 1 0 -1 -1 0 -1 -1 1 -1
  [4,16,1,1,-1,1,0,-1,-1,0,-1,-1,1,-1],
// 4 16 1 1 1 1 0 1 1 0 -1 1 1 -1
  [4,16,1,1,1,1,0,1,1,0,-1,1,1,-1],
];
module ldraw_lib__box5(step=0, col=false, unit=2/5, alt=false, line=0.2, solid=!$preview)
    makepoly(ldraw_lib__box5(solid), step=step, col=col, unit=unit, alt=alt, line=line, solid=solid);
ldraw_lib__box5(line=0.2);
// file: ../p/box4t.scad
use <../lib.scad>
$fa=1; $fs=0.2;
function ldraw_lib__box4t(realsolid=false) = [
// 0 Box with 4 Adjacent Faces and All Edges
// 0 Name: box4t.dat
// 0 Author: Tore Eriksson [Tore_Eriksson]
// 0 !LDRAW_ORG Primitive UPDATE 2003-02
// 0 !LICENSE Licensed under CC BY 2.0 and CC BY 4.0 : see CAreadme.txt
// 
// 0 BFC CERTIFY CCW
  [0,"BFC","CERTIFY"],
  [0,"BFC","CCW"],
// 
// 0 !HISTORY 1997-09-29 [PTadmin] Official Update 1997-15
// 0 !HISTORY 2002-08-31 [izanette] Modified with WINDZ for BFC compliance
// 0 !HISTORY 2003-08-01 [PTadmin] Official Update 2003-02
// 0 !HISTORY 2007-06-24 [PTadmin] Header formatted for Contributor Agreement
// 0 !HISTORY 2008-07-01 [PTadmin] Official Update 2008-01
// 
// 
// 2 24 1 1 1 -1 1 1
  [2,24,1,1,1,-1,1,1],
// 2 24 -1 1 1 -1 1 -1
  [2,24,-1,1,1,-1,1,-1],
// 2 24 -1 1 -1 1 1 -1
  [2,24,-1,1,-1,1,1,-1],
// 2 24 1 1 -1 1 1 1
  [2,24,1,1,-1,1,1,1],
// 2 24 1 0 1 -1 0 1
  [2,24,1,0,1,-1,0,1],
// 2 24 -1 0 1 -1 0 -1
  [2,24,-1,0,1,-1,0,-1],
// 2 24 -1 0 -1 1 0 -1
  [2,24,-1,0,-1,1,0,-1],
// 2 24 1 0 -1 1 0 1
  [2,24,1,0,-1,1,0,1],
// 2 24 1 0 1 1 1 1
  [2,24,1,0,1,1,1,1],
// 2 24 -1 0 1 -1 1 1
  [2,24,-1,0,1,-1,1,1],
// 2 24 1 0 -1 1 1 -1
  [2,24,1,0,-1,1,1,-1],
// 2 24 -1 0 -1 -1 1 -1
  [2,24,-1,0,-1,-1,1,-1],
// 4 16 1 1 1 1 1 -1 -1 1 -1 -1 1 1
  [4,16,1,1,1,1,1,-1,-1,1,-1,-1,1,1],
// 4 16 1 1 1 -1 1 1 -1 0 1 1 0 1
  [4,16,1,1,1,-1,1,1,-1,0,1,1,0,1],
// 4 16 -1 1 1 -1 1 -1 -1 0 -1 -1 0 1
  [4,16,-1,1,1,-1,1,-1,-1,0,-1,-1,0,1],
// 0 4 16 -1 1 -1 -1 0 -1 1 0 -1 1 1 -1
// 4 16 1 1 -1 1 1 1 1 0 1 1 0 -1
  [4,16,1,1,-1,1,1,1,1,0,1,1,0,-1],
// 0
];
module ldraw_lib__box4t(step=0, col=false, unit=2/5, alt=false, line=0.2, solid=!$preview)
    makepoly(ldraw_lib__box4t(solid), step=step, col=col, unit=unit, alt=alt, line=line, solid=solid);
ldraw_lib__box4t(line=0.2);
// file: 3004.scad
use <../lib.scad>
use <s/3004s01.scad>
$fa=1; $fs=0.2;
function ldraw_lib__3004(realsolid=false) = [
// 0 Brick  1 x  2
// 0 Name: 3004.dat
// 0 Author: James Jessiman
// 0 !LDRAW_ORG Part UPDATE 2022-05
// 0 !LICENSE Licensed under CC BY 2.0 and CC BY 4.0 : see CAreadme.txt
// 
// 0 BFC CERTIFY CCW
  [0,"BFC","CERTIFY"],
  [0,"BFC","CCW"],
// 
// 0 !HISTORY 2001-10-26 [PTadmin] Official Update 2001-01
// 0 !HISTORY 2002-05-07 {unknown} BFC Certification
// 0 !HISTORY 2002-06-11 [PTadmin] Official Update 2002-03
// 0 !HISTORY 2007-05-07 [PTadmin] Header formatted for Contributor Agreement
// 0 !HISTORY 2008-07-01 [PTadmin] Official Update 2008-01
// 0 !HISTORY 2022-08-04 [MagFors] Using subfile
// 0 !HISTORY 2022-09-15 [PTadmin] Official Update 2022-05
// 
// 
// 1 16 0 0 0 1 0 0 0 1 0 0 0 1 s\3004s01.dat
  [1,16,0,0,0,1,0,0,0,1,0,0,0,1, ldraw_lib__s__3004s01(realsolid)],
// 4 16 -20 24 -10 20 24 -10 20 0 -10 -20 0 -10
  [4,16,-20,24,-10,20,24,-10,20,0,-10,-20,0,-10],
];
module ldraw_lib__3004(step=0, col=false, unit=2/5, alt=false, line=0.2, solid=!$preview)
    makepoly(ldraw_lib__3004(solid), step=step, col=col, unit=unit, alt=alt, line=line, solid=solid);
ldraw_lib__3004(line=0.2);
// file: s/3024s01.scad
use <../../lib.scad>
use <../../p/box4t.scad>
use <../../p/box5.scad>
use <../../p/stud.scad>
$fa=1; $fs=0.2;
function ldraw_lib__s__3024s01(realsolid=false) = [
// 0 ~Plate  1 x  1 without Front Face
// 0 Name: s\3024s01.dat
// 0 Author: Tore Eriksson [Tore_Eriksson]
// 0 !LDRAW_ORG Subpart UPDATE 2012-03
// 0 !LICENSE Licensed under CC BY 2.0 and CC BY 4.0 : see CAreadme.txt
// 
// 0 BFC CERTIFY CCW
  [0,"BFC","CERTIFY"],
  [0,"BFC","CCW"],
// 
// 0 !HISTORY 2012-12-28 [PTadmin] Official Update 2012-03
// 
// 
// 0 BFC INVERTNEXT
  [0,"BFC","INVERTNEXT"],
// 1 16 0 8 0 0 0 6 0 -4 0 -6 0 0 box5.dat
  [1,16,0,8,0,0,0,6,0,-4,0,-6,0,0, ldraw_lib__box5(realsolid)],
// 4 16 10 8 -10 6 8 -6 6 8 6 10 8 10
  [4,16,10,8,-10,6,8,-6,6,8,6,10,8,10],
// 4 16 10 8 10 6 8 6 -6 8 6 -10 8 10
  [4,16,10,8,10,6,8,6,-6,8,6,-10,8,10],
// 4 16 -10 8 10 -6 8 6 -6 8 -6 -10 8 -10
  [4,16,-10,8,10,-6,8,6,-6,8,-6,-10,8,-10],
// 4 16 -10 8 -10 -6 8 -6 6 8 -6 10 8 -10
  [4,16,-10,8,-10,-6,8,-6,6,8,-6,10,8,-10],
// 1 16 0 8 0 10 0 0 0 -8 0 0 0 10 box4t.dat
  [1,16,0,8,0,10,0,0,0,-8,0,0,0,10, ldraw_lib__box4t(realsolid)],
// 1 16 0 0 0 0 0 1 0 1 0 -1 0 0 stud.dat
  [1,16,0,0,0,0,0,1,0,1,0,-1,0,0, ldraw_lib__stud(realsolid)],
];
module ldraw_lib__s__3024s01(step=0, col=false, unit=2/5, alt=false, line=0.2, solid=!$preview)
    makepoly(ldraw_lib__s__3024s01(solid), step=step, col=col, unit=unit, alt=alt, line=line, solid=solid);
ldraw_lib__s__3024s01(line=0.2);
// main file
use <../lib.scad>
use <s/3024s01.scad>
$fa=1; $fs=0.2;
function ldraw_lib__3024ptc9(realsolid=false) = [
// 0 Plate  1 x  1 with Minecraft Face Pattern
// 0 Name: 3024ptc9.dat
// 0 Author: Vincent Messenet [Cheenzo]
// 0 !LDRAW_ORG Part UPDATE 2020-03
// 0 !LICENSE Licensed under CC BY 2.0 and CC BY 4.0 : see CAreadme.txt
// 
// 0 BFC CERTIFY CCW
  [0,"BFC","CERTIFY"],
  [0,"BFC","CCW"],
// 
// 0 !KEYWORDS Bat, BrickLink 3024pb009, Eyes, Minecraft, Mouth, Set 21137
// 0 !KEYWORDS Set 21141, set 21147, Set 21155
// 
// 0 !HISTORY 2020-12-29 [PTadmin] Official Update 2020-03
// 
// 
// 1 16 0 0 0 1 0 0 0 1 0 0 0 1 s\3024s01.dat
  [1,16,0,0,0,1,0,0,0,1,0,0,0,1, ldraw_lib__s__3024s01(realsolid)],
// 
// 4 0 -5.85 5.75 -10 -5.85 7.75 -10 5.85 7.75 -10 5.85 5.75 -10
  [4,0,-5.85,5.75,-10,-5.85,7.75,-10,5.85,7.75,-10,5.85,5.75,-10],
// 4 0 -5.85 .75 -10 -5.85 4 -10 -1.95 4.5 -10 -1.95 .25 -10
  [4,0,-5.85,.75,-10,-5.85,4,-10,-1.95,4.5,-10,-1.95,.25,-10],
// 4 0 1.95 .25 -10 1.95 4.5 -10 5.85 4 -10 5.85 .75 -10
  [4,0,1.95,.25,-10,1.95,4.5,-10,5.85,4,-10,5.85,.75,-10],
// 4 0 -9.25 .75 -10 -5.85 .75 -10 -1.95 .25 -10 -9.75 .25 -10
  [4,0,-9.25,.75,-10,-5.85,.75,-10,-1.95,.25,-10,-9.75,.25,-10],
// 4 0 -9.25 4 -10 -9.25 .75 -10 -9.75 .25 -10 -9.75 4.5 -10
  [4,0,-9.25,4,-10,-9.25,.75,-10,-9.75,.25,-10,-9.75,4.5,-10],
// 4 0 -1.95 4.5 -10 -5.85 4 -10 -9.25 4 -10 -9.75 4.5 -10
  [4,0,-1.95,4.5,-10,-5.85,4,-10,-9.25,4,-10,-9.75,4.5,-10],
// 4 0 1.95 .25 -10 5.85 .75 -10 9.25 .75 -10 9.75 .25 -10
  [4,0,1.95,.25,-10,5.85,.75,-10,9.25,.75,-10,9.75,.25,-10],
// 4 0 9.75 4.5 -10 9.75 .25 -10 9.25 .75 -10 9.25 4 -10
  [4,0,9.75,4.5,-10,9.75,.25,-10,9.25,.75,-10,9.25,4,-10],
// 4 0 5.85 4 -10 1.95 4.5 -10 9.75 4.5 -10 9.25 4 -10
  [4,0,5.85,4,-10,1.95,4.5,-10,9.75,4.5,-10,9.25,4,-10],
// 4 15 -5.85 4 -10 -5.85 .75 -10 -9.25 .75 -10 -9.25 4 -10
  [4,15,-5.85,4,-10,-5.85,.75,-10,-9.25,.75,-10,-9.25,4,-10],
// 4 15 5.85 .75 -10 5.85 4 -10 9.25 4 -10 9.25 .75 -10
  [4,15,5.85,.75,-10,5.85,4,-10,9.25,4,-10,9.25,.75,-10],
// 3 16 -10 0 -10 -9.75 .25 -10 -1.95 .25 -10
  [3,16,-10,0,-10,-9.75,.25,-10,-1.95,.25,-10],
// 4 16 -10 0 -10 -1.95 .25 -10 1.95 .25 -10 10 0 -10
  [4,16,-10,0,-10,-1.95,.25,-10,1.95,.25,-10,10,0,-10],
// 3 16 1.95 .25 -10 9.75 .25 -10 10 0 -10
  [3,16,1.95,.25,-10,9.75,.25,-10,10,0,-10],
// 4 16 10 0 -10 9.75 .25 -10 9.75 4.5 -10 10 8 -10
  [4,16,10,0,-10,9.75,.25,-10,9.75,4.5,-10,10,8,-10],
// 4 16 5.85 7.75 -10 10 8 -10 9.75 4.5 -10 5.85 5.75 -10
  [4,16,5.85,7.75,-10,10,8,-10,9.75,4.5,-10,5.85,5.75,-10],
// 4 16 10 8 -10 5.85 7.75 -10 -5.85 7.75 -10 -10 8 -10
  [4,16,10,8,-10,5.85,7.75,-10,-5.85,7.75,-10,-10,8,-10],
// 4 16 -9.75 4.5 -10 -10 8 -10 -5.85 7.75 -10 -5.85 5.75 -10
  [4,16,-9.75,4.5,-10,-10,8,-10,-5.85,7.75,-10,-5.85,5.75,-10],
// 4 16 -10 8 -10 -9.75 4.5 -10 -9.75 .25 -10 -10 0 -10
  [4,16,-10,8,-10,-9.75,4.5,-10,-9.75,.25,-10,-10,0,-10],
// 4 16 1.95 .25 -10 -1.95 .25 -10 -1.95 4.5 -10 1.95 4.5 -10
  [4,16,1.95,.25,-10,-1.95,.25,-10,-1.95,4.5,-10,1.95,4.5,-10],
// 3 16 -9.75 4.5 -10 -5.85 5.75 -10 -1.95 4.5 -10
  [3,16,-9.75,4.5,-10,-5.85,5.75,-10,-1.95,4.5,-10],
// 4 16 1.95 4.5 -10 -1.95 4.5 -10 -5.85 5.75 -10 5.85 5.75 -10
  [4,16,1.95,4.5,-10,-1.95,4.5,-10,-5.85,5.75,-10,5.85,5.75,-10],
// 3 16 5.85 5.75 -10 9.75 4.5 -10 1.95 4.5 -10
  [3,16,5.85,5.75,-10,9.75,4.5,-10,1.95,4.5,-10],
];
module ldraw_lib__3024ptc9(step=0, col=false, unit=2/5, alt=false, line=0.2, solid=!$preview)
    makepoly(ldraw_lib__3024ptc9(solid), step=step, col=col, unit=unit, alt=alt, line=line, solid=solid);
ldraw_lib__3024ptc9(line=0.2);
